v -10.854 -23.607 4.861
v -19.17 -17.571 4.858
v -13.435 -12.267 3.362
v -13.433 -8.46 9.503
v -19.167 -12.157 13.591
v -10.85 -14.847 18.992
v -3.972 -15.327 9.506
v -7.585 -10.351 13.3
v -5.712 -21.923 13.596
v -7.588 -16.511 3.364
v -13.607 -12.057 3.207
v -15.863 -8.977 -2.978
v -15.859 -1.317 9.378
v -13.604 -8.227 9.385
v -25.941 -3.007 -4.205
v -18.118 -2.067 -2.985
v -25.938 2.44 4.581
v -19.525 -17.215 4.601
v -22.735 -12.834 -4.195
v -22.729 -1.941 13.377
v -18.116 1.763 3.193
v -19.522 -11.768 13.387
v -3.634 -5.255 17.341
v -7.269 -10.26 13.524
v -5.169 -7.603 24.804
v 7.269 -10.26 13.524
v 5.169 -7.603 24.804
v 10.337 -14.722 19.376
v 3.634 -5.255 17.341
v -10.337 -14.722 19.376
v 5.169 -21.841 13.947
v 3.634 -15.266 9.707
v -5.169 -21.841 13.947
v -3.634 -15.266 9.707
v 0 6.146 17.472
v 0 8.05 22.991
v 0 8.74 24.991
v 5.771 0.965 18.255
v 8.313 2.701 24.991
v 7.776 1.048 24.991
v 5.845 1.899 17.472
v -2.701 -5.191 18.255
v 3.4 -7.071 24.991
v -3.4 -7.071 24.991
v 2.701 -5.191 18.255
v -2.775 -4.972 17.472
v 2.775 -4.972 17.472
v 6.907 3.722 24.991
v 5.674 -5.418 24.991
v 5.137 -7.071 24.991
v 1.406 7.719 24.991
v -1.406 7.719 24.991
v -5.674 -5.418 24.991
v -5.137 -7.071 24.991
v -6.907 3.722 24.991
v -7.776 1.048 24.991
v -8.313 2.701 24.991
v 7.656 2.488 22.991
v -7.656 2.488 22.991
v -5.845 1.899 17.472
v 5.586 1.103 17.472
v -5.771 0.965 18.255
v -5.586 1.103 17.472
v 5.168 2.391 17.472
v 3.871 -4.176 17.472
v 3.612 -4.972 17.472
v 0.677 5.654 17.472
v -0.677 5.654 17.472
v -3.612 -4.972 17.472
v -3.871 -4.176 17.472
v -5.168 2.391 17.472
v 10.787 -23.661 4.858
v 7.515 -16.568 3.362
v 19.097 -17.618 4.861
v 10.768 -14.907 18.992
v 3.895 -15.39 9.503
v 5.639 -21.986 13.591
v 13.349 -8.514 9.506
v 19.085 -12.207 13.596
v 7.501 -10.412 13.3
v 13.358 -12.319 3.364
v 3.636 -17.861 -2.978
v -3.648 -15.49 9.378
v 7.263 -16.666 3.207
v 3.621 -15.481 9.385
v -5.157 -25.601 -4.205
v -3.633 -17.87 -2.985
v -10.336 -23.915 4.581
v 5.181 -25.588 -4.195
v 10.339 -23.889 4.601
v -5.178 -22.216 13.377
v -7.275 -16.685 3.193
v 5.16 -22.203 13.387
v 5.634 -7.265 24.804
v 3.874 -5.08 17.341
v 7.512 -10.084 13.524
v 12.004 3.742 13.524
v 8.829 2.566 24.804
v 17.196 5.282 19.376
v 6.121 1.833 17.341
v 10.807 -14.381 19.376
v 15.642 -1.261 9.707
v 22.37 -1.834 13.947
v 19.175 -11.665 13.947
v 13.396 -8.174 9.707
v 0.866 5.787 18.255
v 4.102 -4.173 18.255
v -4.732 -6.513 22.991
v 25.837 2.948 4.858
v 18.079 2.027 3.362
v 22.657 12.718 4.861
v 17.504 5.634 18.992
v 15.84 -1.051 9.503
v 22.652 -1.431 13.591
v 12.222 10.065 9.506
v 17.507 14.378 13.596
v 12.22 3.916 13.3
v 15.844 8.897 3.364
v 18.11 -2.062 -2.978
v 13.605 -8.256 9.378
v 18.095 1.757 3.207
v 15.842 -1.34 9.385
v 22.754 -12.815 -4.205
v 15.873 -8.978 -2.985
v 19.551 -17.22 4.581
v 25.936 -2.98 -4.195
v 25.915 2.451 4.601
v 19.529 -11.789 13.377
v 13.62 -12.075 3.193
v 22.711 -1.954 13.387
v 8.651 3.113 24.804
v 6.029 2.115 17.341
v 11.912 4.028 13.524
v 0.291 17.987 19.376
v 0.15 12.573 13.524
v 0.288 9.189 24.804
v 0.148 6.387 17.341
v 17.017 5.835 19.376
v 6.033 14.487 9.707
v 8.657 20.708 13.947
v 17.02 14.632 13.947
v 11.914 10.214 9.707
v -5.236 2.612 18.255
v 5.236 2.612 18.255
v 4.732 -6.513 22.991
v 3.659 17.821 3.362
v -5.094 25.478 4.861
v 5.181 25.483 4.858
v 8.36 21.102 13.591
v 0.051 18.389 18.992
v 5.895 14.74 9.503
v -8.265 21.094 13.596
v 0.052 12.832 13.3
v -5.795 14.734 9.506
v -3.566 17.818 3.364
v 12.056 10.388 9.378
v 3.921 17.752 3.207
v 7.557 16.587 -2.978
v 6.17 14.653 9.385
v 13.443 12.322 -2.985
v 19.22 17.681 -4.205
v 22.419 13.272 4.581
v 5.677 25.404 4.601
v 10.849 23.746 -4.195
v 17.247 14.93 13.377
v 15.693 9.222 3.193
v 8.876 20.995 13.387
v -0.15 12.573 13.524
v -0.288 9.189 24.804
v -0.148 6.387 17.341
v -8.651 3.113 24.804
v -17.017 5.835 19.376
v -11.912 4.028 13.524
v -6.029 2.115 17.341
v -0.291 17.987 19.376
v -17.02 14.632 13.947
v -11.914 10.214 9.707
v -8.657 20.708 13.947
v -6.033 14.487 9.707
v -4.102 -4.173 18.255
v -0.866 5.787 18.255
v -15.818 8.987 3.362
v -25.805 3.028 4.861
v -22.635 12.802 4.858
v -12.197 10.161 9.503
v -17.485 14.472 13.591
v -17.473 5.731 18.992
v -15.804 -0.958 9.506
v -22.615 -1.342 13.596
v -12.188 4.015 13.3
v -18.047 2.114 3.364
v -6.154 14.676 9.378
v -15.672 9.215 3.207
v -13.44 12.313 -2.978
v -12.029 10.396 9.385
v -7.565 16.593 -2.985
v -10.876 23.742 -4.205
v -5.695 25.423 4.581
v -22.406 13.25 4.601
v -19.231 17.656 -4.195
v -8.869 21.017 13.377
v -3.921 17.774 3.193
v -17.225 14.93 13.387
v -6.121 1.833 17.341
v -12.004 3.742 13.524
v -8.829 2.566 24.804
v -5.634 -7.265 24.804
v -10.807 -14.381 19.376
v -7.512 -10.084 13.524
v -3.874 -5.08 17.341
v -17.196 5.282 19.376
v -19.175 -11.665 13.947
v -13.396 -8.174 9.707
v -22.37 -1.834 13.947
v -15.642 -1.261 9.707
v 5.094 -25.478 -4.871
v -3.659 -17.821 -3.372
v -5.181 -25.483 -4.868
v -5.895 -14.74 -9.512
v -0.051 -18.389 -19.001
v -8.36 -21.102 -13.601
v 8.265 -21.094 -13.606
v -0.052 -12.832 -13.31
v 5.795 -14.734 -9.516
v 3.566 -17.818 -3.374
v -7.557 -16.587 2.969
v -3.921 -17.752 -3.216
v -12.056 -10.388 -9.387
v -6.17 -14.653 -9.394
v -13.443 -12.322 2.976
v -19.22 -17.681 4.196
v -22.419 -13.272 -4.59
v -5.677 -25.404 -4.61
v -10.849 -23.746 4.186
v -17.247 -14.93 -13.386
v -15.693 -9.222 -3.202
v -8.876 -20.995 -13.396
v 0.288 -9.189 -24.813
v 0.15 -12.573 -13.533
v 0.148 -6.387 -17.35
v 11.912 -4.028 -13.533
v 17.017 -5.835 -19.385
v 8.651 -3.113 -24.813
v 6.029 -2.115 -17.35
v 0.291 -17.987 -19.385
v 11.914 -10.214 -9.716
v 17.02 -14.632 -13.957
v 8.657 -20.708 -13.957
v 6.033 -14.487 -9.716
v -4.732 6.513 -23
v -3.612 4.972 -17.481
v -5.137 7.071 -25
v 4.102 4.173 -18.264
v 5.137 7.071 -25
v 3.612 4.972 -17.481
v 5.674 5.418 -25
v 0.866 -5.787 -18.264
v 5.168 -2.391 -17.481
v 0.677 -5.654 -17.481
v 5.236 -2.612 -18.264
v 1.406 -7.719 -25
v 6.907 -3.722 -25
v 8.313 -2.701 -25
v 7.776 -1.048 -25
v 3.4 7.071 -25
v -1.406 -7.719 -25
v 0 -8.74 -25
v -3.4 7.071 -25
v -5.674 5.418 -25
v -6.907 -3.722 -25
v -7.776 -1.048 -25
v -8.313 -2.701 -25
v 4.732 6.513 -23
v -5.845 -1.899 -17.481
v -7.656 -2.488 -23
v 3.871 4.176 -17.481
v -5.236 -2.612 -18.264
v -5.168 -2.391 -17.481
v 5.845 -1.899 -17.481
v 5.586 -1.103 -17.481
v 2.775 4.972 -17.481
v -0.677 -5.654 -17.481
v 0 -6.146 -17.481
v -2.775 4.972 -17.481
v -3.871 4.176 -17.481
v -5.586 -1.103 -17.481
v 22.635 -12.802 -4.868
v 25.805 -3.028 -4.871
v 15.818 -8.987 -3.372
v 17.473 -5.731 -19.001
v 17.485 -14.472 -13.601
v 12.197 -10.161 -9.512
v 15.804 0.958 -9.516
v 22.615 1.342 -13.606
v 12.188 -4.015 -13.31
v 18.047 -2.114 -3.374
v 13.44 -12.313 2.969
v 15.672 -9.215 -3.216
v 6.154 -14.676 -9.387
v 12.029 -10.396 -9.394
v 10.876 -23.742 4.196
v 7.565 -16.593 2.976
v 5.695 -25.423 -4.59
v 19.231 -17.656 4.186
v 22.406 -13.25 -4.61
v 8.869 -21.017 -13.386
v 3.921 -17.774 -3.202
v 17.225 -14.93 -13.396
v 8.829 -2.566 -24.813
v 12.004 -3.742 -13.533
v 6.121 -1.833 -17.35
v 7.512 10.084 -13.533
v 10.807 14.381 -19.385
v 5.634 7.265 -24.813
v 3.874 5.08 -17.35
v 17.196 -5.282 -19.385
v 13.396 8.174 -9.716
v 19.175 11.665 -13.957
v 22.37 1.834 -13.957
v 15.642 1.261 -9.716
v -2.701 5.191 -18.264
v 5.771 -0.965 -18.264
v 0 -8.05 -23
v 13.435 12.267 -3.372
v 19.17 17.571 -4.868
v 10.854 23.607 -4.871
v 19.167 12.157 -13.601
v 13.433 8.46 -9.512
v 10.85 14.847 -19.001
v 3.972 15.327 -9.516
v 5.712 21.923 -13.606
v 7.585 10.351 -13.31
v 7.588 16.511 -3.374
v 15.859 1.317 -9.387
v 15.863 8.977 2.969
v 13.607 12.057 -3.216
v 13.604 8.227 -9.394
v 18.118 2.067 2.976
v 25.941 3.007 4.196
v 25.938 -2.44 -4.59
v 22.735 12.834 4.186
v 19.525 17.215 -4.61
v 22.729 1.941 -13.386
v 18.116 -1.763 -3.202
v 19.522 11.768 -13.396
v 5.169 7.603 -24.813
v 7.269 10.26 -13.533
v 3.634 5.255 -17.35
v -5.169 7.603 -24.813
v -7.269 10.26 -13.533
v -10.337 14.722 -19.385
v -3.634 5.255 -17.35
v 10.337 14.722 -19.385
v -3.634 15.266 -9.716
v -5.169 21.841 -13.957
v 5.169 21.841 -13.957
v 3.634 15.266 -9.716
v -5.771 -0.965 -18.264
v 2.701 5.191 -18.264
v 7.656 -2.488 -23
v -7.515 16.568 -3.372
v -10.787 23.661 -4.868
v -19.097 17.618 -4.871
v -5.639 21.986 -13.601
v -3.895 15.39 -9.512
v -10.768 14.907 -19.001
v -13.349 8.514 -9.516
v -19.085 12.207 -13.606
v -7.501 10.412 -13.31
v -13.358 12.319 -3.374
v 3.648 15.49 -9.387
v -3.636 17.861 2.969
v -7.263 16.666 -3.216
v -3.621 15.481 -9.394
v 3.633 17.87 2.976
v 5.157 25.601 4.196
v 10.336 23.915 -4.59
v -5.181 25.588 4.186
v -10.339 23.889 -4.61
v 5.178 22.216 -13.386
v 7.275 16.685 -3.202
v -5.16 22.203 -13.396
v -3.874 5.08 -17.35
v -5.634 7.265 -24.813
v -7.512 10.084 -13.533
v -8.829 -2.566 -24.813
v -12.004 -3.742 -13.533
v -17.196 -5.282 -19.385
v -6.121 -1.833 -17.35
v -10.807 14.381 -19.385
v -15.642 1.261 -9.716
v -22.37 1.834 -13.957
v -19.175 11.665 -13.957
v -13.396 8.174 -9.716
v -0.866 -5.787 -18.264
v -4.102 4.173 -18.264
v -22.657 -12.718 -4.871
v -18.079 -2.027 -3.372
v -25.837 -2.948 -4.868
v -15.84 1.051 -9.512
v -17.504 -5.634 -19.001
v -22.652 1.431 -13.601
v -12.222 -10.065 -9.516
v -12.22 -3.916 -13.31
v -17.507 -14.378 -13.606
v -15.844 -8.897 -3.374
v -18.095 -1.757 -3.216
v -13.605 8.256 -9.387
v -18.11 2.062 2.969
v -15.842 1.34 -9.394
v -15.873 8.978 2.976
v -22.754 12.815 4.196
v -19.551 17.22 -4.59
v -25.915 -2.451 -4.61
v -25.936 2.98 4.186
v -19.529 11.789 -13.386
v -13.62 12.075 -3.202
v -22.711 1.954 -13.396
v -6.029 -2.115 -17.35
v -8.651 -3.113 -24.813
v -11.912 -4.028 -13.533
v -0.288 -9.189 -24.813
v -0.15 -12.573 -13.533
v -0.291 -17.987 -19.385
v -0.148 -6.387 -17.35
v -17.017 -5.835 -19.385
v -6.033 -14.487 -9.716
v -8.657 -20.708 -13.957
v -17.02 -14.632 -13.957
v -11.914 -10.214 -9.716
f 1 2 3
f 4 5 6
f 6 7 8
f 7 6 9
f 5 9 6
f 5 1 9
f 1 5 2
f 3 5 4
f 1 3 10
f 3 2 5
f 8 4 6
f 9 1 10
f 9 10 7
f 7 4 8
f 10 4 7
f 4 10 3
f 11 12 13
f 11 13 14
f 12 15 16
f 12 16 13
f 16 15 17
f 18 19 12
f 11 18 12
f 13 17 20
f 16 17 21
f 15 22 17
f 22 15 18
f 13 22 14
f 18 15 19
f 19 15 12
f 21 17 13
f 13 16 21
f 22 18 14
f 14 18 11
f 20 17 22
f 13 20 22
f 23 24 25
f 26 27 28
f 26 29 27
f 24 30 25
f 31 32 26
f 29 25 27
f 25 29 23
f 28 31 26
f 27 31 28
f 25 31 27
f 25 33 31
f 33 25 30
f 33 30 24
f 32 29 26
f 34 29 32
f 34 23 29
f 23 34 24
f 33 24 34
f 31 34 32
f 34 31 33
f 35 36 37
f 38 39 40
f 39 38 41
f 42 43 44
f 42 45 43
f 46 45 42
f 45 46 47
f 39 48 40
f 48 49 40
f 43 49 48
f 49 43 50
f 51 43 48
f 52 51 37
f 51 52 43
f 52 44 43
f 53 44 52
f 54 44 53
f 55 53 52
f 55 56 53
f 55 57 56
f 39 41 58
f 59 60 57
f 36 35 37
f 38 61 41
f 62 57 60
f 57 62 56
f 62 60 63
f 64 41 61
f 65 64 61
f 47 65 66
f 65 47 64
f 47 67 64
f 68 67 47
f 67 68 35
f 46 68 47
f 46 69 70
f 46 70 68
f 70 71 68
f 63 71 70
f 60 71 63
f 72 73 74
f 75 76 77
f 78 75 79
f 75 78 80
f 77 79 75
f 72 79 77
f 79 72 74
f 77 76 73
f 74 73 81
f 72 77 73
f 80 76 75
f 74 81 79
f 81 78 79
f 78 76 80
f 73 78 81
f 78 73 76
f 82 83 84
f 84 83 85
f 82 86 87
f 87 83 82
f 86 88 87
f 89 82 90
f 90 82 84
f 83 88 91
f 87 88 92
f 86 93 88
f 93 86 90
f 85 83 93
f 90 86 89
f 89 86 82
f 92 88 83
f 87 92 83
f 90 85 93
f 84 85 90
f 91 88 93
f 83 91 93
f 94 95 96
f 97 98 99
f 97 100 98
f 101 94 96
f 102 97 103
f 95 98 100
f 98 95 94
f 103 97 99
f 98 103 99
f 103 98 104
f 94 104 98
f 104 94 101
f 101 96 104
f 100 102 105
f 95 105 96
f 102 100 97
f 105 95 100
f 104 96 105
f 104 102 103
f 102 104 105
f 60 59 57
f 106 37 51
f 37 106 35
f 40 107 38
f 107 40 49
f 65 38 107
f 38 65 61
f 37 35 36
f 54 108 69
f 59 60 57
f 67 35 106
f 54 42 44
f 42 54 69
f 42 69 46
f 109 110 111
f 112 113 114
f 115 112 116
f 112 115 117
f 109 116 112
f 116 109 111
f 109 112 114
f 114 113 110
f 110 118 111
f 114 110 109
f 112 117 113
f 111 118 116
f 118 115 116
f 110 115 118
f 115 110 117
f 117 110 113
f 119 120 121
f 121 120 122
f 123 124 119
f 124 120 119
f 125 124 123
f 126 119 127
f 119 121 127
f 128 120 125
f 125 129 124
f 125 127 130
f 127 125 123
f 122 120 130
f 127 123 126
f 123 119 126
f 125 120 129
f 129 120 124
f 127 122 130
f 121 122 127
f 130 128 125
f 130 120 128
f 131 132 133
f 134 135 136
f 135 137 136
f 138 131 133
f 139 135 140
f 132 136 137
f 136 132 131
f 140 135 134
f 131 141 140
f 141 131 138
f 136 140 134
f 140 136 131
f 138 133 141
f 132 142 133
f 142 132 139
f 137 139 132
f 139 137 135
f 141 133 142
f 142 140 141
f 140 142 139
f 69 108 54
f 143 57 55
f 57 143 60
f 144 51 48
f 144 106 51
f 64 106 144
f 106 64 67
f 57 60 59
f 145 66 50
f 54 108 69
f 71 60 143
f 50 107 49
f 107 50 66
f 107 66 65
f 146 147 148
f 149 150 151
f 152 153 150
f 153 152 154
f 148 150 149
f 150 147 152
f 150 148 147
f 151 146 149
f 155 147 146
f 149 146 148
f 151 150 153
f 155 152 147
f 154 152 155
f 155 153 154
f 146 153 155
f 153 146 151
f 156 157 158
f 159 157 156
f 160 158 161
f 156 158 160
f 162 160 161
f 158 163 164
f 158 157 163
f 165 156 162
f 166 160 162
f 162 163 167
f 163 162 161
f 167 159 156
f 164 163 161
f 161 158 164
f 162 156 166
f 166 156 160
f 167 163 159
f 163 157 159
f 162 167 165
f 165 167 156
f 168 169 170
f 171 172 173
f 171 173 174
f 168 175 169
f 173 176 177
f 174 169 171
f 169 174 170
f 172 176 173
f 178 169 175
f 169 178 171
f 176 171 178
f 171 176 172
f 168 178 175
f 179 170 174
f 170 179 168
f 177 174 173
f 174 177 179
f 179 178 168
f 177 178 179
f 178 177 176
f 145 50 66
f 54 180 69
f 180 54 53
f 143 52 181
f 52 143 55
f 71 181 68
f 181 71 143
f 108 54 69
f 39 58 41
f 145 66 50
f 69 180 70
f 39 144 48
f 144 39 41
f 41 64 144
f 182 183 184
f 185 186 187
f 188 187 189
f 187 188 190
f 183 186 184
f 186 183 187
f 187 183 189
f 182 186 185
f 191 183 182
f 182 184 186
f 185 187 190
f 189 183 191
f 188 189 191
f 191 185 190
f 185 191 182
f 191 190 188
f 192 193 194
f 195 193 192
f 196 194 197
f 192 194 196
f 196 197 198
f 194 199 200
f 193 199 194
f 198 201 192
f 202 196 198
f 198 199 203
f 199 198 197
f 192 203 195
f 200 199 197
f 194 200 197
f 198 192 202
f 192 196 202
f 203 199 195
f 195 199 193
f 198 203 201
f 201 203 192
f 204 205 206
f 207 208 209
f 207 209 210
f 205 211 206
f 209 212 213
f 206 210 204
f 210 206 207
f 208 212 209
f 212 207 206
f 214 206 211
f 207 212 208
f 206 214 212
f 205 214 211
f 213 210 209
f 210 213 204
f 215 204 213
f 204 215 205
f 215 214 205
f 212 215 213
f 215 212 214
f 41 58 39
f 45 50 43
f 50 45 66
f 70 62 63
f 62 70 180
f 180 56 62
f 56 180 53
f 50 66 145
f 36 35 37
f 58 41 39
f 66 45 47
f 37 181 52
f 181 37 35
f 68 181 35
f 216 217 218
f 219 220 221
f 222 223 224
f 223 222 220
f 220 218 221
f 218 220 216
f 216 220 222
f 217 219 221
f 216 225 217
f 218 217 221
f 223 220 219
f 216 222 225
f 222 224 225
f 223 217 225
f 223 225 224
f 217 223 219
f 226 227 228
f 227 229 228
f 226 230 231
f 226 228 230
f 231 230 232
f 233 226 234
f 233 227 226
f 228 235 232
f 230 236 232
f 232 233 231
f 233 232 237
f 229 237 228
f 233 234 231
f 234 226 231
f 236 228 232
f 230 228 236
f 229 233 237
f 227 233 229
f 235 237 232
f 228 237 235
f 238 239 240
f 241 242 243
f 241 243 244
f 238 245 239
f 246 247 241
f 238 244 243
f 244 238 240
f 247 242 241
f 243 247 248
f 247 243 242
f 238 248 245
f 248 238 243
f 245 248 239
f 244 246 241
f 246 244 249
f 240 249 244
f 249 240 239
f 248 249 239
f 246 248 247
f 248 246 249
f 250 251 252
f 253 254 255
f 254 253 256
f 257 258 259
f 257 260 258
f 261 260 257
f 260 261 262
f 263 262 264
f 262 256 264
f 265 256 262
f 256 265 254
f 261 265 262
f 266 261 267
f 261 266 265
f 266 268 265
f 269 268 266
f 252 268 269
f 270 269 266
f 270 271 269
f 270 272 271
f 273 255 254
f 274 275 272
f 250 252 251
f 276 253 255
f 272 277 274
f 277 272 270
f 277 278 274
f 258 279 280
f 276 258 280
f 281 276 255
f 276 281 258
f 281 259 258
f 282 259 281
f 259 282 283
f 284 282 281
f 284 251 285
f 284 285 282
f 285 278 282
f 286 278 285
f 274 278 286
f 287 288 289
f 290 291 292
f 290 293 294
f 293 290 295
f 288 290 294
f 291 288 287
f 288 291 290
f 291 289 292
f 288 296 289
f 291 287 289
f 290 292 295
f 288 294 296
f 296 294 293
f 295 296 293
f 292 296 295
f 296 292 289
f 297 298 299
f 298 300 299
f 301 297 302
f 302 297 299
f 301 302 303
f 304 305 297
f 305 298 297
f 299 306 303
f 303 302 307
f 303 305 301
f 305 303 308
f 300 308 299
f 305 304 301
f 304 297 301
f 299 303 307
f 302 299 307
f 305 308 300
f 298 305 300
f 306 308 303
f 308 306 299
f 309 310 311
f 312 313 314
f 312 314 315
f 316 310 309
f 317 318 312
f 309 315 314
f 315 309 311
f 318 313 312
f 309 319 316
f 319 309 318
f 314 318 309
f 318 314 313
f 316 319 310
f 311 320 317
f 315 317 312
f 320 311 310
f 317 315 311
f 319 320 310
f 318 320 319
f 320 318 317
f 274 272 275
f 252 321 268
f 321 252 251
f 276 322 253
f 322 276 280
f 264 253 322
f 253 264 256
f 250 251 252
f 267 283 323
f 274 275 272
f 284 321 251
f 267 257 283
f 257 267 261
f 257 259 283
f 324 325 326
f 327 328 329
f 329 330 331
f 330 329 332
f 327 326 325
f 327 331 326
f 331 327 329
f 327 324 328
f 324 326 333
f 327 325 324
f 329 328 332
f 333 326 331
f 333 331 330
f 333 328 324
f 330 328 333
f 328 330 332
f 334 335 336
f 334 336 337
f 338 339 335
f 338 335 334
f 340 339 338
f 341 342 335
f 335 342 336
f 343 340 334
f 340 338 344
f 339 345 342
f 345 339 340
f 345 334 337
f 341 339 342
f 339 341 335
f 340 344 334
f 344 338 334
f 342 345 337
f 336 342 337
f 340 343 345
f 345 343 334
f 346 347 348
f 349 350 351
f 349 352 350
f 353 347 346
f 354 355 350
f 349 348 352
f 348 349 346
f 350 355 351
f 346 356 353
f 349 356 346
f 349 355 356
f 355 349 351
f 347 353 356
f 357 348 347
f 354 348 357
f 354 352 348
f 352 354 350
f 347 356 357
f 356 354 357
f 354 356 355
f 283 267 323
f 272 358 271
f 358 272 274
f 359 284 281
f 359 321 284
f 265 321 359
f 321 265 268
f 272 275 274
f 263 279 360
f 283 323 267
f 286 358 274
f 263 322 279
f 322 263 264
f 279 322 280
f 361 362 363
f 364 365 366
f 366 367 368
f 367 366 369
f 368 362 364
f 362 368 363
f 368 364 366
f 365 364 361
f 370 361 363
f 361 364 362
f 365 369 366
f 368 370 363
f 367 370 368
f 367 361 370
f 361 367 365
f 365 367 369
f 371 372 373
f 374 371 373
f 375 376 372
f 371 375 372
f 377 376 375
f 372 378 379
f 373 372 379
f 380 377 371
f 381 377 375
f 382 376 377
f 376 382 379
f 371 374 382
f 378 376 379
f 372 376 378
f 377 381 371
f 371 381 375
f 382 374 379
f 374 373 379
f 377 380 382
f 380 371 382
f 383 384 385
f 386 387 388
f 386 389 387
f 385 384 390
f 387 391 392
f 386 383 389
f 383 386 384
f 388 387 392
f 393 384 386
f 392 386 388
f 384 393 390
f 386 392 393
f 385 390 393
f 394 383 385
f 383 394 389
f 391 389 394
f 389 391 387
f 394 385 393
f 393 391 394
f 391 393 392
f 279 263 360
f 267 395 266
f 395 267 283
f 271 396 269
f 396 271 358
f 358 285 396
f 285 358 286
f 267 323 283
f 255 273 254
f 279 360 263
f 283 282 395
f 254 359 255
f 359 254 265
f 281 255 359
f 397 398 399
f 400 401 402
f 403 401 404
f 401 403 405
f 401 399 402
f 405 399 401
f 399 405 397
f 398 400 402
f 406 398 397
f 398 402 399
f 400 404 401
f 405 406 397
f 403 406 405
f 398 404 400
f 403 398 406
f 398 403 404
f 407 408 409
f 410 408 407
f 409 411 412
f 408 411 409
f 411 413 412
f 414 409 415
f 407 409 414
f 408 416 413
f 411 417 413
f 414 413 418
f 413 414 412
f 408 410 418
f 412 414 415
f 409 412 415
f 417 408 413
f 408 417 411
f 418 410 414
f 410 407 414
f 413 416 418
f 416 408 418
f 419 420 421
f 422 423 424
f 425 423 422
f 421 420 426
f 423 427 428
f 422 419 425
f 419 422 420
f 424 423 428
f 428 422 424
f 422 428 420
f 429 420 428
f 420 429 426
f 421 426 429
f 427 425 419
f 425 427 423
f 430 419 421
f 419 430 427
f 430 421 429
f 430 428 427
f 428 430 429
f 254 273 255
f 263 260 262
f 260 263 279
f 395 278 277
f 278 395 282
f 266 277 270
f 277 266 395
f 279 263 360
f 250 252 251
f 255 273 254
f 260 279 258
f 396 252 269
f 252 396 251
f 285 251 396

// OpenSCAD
height = 50; 
spacing = 0.5;

// create a generalized pentagon by length.
// Parameters:
//     length : the side length
//     spacing : the gap between a pentagon or a hexagon
module generalized_pentagon(length, spacing = 0.5) {
    r = 0.5 * length / sin(36);
	s = (r - spacing / 2) / r;

    color("black") 
	    rotate(18) 		     
		     linear_extrude(length, scale = 1.42215)
		        scale([s, s, s])
			        children(); 
}

// create a generalized hexagon by length.
// Parameters:
//     length : the side length
//     spacing : the gap between a pentagon or a hexagon
module generalized_hexagon(length, spacing = 0.5) {
    r = 0.5 * length / sin(30);
	s = (r - spacing / 2) / r;

    color("white") 
	     linear_extrude(length - length * 0.02125, scale = 1.42215) 
		    scale([s, s, s])			
		        children();
}

// two generalized pentagons and two generalized hexagons.
// Parameters:
//     length : the side length
//     spacing : the gap between the pentagon and hexagon
module generalized_pentagon_based_sub_comp(length, spacing = 0.5) {
	pentagon_circle_r = 0.5 * length / sin(36);
	
	children(0); 
	
	a = 37.325;
	
	offset_y = 0.5 * length * tan(54) + pentagon_circle_r * cos(a);
	offset_z = 0.5 * length * tan(60) * sin(a);
	
	translate([0, -offset_y, -offset_z]) 
	    rotate([a, 0, 0]) 
		    generalized_hexagon_based_sub_comp(length, spacing) {
			    children(0); 
				children(1); 
			}
}


// two generalized hexagons and one generalized pentagon.
// Parameters:
//     length : the side length
//     spacing : the gap between the pentagon and hexagon
module generalized_hexagon_based_sub_comp(length, spacing = 0.5) {
    children(1); 
	
	length_center_to_side = 0.5 * length * tan(54);
	
    a = -37.325;
	
	offset_y = 0.5 * length * (tan(54) * cos(a) + tan(60));
	offset_z = length_center_to_side * sin(a);
	
	rotate(120) translate([0, offset_y, offset_z]) 
	    rotate([a, 0, 0]) 
	        generalized_pentagon_hexagon(length, spacing) {
			    children(0);
			    children(1);
			}
			
}

// a generalized pentagon and a generalized hexagon.
// Parameters:
//     length : the side length
//     spacing : the gap between the pentagon and hexagon
module generalized_pentagon_hexagon(length, spacing = 0.5) {
	pentagon_circle_r = 0.5 * length / sin(36);
	
	children(0); 
	
	a = 37.325;
	
	offset_y = 0.5 * length * tan(54) + pentagon_circle_r * cos(a);
	offset_z = 0.5 * length * tan(60) * sin(a);
	
	rotate(144) translate([0, -offset_y, -offset_z]) 
	    rotate([a, 0, 0]) 
		    children(1); 
}

// a half of generalized soccer polyhedron.
// Parameters:
//     line_length : the side length of pentagons and hexagons
//     spacing : the gap between the pentagon and hexagon
module generalized_half_soccer_polyhedron(line_length, spacing = 0.5) {
	pentagon_circle_r = 0.5 * line_length / sin(36);
	offset_y = pentagon_circle_r * cos(36);

	for(i = [0:4]) {
		rotate(72 * i) 
		    generalized_pentagon_based_sub_comp(line_length, spacing) {
			    children(0);
				children(1);
			}
	}
}

// a generalized soccer polyhedron.
// Parameters:
//     line_length : the side length of pentagons and hexagons
//     spacing : the gap between the pentagon and hexagon
//     center : center it or not
module generalized_soccer_polyhedron(height, spacing = 0.5, center = true) {
    line_length = height / 6.65;
	
	offset_for_center = center ? height / 2: 0;
	
	translate([0, 0, -offset_for_center]) union() {
		translate([0, 0, -line_length + line_length * 6.64875]) 
		    generalized_half_soccer_polyhedron(line_length, spacing) {
			    generalized_pentagon(line_length, spacing) children(0);
			    generalized_hexagon(line_length, spacing) children(1);			
			}
			
		rotate(36) mirror([0, 0, 1]) translate([0, 0, -line_length]) 
		    generalized_half_soccer_polyhedron(line_length, spacing) {
			    generalized_pentagon(line_length, spacing) children(0);
			    generalized_hexagon(line_length, spacing) children(1);				
			}
	}
}

// create a pentagon according the height of the soccer polyhedron
module pentagon_for_soccer_polyhedron(height) {
    line_length = height / 6.65;
    circle(0.5 * line_length / sin(36), $fn = 5);
}

// create a hexagon according the height of the soccer polyhedron
module hexagon_for_soccer_polyhedron(height) {
    line_length = height / 6.65;
    circle(0.5 * line_length / sin(30), $fn = 6);			
}

generalized_soccer_polyhedron(height, spacing) {
    pentagon_for_soccer_polyhedron(height); 
	 hexagon_for_soccer_polyhedron(height);
}
